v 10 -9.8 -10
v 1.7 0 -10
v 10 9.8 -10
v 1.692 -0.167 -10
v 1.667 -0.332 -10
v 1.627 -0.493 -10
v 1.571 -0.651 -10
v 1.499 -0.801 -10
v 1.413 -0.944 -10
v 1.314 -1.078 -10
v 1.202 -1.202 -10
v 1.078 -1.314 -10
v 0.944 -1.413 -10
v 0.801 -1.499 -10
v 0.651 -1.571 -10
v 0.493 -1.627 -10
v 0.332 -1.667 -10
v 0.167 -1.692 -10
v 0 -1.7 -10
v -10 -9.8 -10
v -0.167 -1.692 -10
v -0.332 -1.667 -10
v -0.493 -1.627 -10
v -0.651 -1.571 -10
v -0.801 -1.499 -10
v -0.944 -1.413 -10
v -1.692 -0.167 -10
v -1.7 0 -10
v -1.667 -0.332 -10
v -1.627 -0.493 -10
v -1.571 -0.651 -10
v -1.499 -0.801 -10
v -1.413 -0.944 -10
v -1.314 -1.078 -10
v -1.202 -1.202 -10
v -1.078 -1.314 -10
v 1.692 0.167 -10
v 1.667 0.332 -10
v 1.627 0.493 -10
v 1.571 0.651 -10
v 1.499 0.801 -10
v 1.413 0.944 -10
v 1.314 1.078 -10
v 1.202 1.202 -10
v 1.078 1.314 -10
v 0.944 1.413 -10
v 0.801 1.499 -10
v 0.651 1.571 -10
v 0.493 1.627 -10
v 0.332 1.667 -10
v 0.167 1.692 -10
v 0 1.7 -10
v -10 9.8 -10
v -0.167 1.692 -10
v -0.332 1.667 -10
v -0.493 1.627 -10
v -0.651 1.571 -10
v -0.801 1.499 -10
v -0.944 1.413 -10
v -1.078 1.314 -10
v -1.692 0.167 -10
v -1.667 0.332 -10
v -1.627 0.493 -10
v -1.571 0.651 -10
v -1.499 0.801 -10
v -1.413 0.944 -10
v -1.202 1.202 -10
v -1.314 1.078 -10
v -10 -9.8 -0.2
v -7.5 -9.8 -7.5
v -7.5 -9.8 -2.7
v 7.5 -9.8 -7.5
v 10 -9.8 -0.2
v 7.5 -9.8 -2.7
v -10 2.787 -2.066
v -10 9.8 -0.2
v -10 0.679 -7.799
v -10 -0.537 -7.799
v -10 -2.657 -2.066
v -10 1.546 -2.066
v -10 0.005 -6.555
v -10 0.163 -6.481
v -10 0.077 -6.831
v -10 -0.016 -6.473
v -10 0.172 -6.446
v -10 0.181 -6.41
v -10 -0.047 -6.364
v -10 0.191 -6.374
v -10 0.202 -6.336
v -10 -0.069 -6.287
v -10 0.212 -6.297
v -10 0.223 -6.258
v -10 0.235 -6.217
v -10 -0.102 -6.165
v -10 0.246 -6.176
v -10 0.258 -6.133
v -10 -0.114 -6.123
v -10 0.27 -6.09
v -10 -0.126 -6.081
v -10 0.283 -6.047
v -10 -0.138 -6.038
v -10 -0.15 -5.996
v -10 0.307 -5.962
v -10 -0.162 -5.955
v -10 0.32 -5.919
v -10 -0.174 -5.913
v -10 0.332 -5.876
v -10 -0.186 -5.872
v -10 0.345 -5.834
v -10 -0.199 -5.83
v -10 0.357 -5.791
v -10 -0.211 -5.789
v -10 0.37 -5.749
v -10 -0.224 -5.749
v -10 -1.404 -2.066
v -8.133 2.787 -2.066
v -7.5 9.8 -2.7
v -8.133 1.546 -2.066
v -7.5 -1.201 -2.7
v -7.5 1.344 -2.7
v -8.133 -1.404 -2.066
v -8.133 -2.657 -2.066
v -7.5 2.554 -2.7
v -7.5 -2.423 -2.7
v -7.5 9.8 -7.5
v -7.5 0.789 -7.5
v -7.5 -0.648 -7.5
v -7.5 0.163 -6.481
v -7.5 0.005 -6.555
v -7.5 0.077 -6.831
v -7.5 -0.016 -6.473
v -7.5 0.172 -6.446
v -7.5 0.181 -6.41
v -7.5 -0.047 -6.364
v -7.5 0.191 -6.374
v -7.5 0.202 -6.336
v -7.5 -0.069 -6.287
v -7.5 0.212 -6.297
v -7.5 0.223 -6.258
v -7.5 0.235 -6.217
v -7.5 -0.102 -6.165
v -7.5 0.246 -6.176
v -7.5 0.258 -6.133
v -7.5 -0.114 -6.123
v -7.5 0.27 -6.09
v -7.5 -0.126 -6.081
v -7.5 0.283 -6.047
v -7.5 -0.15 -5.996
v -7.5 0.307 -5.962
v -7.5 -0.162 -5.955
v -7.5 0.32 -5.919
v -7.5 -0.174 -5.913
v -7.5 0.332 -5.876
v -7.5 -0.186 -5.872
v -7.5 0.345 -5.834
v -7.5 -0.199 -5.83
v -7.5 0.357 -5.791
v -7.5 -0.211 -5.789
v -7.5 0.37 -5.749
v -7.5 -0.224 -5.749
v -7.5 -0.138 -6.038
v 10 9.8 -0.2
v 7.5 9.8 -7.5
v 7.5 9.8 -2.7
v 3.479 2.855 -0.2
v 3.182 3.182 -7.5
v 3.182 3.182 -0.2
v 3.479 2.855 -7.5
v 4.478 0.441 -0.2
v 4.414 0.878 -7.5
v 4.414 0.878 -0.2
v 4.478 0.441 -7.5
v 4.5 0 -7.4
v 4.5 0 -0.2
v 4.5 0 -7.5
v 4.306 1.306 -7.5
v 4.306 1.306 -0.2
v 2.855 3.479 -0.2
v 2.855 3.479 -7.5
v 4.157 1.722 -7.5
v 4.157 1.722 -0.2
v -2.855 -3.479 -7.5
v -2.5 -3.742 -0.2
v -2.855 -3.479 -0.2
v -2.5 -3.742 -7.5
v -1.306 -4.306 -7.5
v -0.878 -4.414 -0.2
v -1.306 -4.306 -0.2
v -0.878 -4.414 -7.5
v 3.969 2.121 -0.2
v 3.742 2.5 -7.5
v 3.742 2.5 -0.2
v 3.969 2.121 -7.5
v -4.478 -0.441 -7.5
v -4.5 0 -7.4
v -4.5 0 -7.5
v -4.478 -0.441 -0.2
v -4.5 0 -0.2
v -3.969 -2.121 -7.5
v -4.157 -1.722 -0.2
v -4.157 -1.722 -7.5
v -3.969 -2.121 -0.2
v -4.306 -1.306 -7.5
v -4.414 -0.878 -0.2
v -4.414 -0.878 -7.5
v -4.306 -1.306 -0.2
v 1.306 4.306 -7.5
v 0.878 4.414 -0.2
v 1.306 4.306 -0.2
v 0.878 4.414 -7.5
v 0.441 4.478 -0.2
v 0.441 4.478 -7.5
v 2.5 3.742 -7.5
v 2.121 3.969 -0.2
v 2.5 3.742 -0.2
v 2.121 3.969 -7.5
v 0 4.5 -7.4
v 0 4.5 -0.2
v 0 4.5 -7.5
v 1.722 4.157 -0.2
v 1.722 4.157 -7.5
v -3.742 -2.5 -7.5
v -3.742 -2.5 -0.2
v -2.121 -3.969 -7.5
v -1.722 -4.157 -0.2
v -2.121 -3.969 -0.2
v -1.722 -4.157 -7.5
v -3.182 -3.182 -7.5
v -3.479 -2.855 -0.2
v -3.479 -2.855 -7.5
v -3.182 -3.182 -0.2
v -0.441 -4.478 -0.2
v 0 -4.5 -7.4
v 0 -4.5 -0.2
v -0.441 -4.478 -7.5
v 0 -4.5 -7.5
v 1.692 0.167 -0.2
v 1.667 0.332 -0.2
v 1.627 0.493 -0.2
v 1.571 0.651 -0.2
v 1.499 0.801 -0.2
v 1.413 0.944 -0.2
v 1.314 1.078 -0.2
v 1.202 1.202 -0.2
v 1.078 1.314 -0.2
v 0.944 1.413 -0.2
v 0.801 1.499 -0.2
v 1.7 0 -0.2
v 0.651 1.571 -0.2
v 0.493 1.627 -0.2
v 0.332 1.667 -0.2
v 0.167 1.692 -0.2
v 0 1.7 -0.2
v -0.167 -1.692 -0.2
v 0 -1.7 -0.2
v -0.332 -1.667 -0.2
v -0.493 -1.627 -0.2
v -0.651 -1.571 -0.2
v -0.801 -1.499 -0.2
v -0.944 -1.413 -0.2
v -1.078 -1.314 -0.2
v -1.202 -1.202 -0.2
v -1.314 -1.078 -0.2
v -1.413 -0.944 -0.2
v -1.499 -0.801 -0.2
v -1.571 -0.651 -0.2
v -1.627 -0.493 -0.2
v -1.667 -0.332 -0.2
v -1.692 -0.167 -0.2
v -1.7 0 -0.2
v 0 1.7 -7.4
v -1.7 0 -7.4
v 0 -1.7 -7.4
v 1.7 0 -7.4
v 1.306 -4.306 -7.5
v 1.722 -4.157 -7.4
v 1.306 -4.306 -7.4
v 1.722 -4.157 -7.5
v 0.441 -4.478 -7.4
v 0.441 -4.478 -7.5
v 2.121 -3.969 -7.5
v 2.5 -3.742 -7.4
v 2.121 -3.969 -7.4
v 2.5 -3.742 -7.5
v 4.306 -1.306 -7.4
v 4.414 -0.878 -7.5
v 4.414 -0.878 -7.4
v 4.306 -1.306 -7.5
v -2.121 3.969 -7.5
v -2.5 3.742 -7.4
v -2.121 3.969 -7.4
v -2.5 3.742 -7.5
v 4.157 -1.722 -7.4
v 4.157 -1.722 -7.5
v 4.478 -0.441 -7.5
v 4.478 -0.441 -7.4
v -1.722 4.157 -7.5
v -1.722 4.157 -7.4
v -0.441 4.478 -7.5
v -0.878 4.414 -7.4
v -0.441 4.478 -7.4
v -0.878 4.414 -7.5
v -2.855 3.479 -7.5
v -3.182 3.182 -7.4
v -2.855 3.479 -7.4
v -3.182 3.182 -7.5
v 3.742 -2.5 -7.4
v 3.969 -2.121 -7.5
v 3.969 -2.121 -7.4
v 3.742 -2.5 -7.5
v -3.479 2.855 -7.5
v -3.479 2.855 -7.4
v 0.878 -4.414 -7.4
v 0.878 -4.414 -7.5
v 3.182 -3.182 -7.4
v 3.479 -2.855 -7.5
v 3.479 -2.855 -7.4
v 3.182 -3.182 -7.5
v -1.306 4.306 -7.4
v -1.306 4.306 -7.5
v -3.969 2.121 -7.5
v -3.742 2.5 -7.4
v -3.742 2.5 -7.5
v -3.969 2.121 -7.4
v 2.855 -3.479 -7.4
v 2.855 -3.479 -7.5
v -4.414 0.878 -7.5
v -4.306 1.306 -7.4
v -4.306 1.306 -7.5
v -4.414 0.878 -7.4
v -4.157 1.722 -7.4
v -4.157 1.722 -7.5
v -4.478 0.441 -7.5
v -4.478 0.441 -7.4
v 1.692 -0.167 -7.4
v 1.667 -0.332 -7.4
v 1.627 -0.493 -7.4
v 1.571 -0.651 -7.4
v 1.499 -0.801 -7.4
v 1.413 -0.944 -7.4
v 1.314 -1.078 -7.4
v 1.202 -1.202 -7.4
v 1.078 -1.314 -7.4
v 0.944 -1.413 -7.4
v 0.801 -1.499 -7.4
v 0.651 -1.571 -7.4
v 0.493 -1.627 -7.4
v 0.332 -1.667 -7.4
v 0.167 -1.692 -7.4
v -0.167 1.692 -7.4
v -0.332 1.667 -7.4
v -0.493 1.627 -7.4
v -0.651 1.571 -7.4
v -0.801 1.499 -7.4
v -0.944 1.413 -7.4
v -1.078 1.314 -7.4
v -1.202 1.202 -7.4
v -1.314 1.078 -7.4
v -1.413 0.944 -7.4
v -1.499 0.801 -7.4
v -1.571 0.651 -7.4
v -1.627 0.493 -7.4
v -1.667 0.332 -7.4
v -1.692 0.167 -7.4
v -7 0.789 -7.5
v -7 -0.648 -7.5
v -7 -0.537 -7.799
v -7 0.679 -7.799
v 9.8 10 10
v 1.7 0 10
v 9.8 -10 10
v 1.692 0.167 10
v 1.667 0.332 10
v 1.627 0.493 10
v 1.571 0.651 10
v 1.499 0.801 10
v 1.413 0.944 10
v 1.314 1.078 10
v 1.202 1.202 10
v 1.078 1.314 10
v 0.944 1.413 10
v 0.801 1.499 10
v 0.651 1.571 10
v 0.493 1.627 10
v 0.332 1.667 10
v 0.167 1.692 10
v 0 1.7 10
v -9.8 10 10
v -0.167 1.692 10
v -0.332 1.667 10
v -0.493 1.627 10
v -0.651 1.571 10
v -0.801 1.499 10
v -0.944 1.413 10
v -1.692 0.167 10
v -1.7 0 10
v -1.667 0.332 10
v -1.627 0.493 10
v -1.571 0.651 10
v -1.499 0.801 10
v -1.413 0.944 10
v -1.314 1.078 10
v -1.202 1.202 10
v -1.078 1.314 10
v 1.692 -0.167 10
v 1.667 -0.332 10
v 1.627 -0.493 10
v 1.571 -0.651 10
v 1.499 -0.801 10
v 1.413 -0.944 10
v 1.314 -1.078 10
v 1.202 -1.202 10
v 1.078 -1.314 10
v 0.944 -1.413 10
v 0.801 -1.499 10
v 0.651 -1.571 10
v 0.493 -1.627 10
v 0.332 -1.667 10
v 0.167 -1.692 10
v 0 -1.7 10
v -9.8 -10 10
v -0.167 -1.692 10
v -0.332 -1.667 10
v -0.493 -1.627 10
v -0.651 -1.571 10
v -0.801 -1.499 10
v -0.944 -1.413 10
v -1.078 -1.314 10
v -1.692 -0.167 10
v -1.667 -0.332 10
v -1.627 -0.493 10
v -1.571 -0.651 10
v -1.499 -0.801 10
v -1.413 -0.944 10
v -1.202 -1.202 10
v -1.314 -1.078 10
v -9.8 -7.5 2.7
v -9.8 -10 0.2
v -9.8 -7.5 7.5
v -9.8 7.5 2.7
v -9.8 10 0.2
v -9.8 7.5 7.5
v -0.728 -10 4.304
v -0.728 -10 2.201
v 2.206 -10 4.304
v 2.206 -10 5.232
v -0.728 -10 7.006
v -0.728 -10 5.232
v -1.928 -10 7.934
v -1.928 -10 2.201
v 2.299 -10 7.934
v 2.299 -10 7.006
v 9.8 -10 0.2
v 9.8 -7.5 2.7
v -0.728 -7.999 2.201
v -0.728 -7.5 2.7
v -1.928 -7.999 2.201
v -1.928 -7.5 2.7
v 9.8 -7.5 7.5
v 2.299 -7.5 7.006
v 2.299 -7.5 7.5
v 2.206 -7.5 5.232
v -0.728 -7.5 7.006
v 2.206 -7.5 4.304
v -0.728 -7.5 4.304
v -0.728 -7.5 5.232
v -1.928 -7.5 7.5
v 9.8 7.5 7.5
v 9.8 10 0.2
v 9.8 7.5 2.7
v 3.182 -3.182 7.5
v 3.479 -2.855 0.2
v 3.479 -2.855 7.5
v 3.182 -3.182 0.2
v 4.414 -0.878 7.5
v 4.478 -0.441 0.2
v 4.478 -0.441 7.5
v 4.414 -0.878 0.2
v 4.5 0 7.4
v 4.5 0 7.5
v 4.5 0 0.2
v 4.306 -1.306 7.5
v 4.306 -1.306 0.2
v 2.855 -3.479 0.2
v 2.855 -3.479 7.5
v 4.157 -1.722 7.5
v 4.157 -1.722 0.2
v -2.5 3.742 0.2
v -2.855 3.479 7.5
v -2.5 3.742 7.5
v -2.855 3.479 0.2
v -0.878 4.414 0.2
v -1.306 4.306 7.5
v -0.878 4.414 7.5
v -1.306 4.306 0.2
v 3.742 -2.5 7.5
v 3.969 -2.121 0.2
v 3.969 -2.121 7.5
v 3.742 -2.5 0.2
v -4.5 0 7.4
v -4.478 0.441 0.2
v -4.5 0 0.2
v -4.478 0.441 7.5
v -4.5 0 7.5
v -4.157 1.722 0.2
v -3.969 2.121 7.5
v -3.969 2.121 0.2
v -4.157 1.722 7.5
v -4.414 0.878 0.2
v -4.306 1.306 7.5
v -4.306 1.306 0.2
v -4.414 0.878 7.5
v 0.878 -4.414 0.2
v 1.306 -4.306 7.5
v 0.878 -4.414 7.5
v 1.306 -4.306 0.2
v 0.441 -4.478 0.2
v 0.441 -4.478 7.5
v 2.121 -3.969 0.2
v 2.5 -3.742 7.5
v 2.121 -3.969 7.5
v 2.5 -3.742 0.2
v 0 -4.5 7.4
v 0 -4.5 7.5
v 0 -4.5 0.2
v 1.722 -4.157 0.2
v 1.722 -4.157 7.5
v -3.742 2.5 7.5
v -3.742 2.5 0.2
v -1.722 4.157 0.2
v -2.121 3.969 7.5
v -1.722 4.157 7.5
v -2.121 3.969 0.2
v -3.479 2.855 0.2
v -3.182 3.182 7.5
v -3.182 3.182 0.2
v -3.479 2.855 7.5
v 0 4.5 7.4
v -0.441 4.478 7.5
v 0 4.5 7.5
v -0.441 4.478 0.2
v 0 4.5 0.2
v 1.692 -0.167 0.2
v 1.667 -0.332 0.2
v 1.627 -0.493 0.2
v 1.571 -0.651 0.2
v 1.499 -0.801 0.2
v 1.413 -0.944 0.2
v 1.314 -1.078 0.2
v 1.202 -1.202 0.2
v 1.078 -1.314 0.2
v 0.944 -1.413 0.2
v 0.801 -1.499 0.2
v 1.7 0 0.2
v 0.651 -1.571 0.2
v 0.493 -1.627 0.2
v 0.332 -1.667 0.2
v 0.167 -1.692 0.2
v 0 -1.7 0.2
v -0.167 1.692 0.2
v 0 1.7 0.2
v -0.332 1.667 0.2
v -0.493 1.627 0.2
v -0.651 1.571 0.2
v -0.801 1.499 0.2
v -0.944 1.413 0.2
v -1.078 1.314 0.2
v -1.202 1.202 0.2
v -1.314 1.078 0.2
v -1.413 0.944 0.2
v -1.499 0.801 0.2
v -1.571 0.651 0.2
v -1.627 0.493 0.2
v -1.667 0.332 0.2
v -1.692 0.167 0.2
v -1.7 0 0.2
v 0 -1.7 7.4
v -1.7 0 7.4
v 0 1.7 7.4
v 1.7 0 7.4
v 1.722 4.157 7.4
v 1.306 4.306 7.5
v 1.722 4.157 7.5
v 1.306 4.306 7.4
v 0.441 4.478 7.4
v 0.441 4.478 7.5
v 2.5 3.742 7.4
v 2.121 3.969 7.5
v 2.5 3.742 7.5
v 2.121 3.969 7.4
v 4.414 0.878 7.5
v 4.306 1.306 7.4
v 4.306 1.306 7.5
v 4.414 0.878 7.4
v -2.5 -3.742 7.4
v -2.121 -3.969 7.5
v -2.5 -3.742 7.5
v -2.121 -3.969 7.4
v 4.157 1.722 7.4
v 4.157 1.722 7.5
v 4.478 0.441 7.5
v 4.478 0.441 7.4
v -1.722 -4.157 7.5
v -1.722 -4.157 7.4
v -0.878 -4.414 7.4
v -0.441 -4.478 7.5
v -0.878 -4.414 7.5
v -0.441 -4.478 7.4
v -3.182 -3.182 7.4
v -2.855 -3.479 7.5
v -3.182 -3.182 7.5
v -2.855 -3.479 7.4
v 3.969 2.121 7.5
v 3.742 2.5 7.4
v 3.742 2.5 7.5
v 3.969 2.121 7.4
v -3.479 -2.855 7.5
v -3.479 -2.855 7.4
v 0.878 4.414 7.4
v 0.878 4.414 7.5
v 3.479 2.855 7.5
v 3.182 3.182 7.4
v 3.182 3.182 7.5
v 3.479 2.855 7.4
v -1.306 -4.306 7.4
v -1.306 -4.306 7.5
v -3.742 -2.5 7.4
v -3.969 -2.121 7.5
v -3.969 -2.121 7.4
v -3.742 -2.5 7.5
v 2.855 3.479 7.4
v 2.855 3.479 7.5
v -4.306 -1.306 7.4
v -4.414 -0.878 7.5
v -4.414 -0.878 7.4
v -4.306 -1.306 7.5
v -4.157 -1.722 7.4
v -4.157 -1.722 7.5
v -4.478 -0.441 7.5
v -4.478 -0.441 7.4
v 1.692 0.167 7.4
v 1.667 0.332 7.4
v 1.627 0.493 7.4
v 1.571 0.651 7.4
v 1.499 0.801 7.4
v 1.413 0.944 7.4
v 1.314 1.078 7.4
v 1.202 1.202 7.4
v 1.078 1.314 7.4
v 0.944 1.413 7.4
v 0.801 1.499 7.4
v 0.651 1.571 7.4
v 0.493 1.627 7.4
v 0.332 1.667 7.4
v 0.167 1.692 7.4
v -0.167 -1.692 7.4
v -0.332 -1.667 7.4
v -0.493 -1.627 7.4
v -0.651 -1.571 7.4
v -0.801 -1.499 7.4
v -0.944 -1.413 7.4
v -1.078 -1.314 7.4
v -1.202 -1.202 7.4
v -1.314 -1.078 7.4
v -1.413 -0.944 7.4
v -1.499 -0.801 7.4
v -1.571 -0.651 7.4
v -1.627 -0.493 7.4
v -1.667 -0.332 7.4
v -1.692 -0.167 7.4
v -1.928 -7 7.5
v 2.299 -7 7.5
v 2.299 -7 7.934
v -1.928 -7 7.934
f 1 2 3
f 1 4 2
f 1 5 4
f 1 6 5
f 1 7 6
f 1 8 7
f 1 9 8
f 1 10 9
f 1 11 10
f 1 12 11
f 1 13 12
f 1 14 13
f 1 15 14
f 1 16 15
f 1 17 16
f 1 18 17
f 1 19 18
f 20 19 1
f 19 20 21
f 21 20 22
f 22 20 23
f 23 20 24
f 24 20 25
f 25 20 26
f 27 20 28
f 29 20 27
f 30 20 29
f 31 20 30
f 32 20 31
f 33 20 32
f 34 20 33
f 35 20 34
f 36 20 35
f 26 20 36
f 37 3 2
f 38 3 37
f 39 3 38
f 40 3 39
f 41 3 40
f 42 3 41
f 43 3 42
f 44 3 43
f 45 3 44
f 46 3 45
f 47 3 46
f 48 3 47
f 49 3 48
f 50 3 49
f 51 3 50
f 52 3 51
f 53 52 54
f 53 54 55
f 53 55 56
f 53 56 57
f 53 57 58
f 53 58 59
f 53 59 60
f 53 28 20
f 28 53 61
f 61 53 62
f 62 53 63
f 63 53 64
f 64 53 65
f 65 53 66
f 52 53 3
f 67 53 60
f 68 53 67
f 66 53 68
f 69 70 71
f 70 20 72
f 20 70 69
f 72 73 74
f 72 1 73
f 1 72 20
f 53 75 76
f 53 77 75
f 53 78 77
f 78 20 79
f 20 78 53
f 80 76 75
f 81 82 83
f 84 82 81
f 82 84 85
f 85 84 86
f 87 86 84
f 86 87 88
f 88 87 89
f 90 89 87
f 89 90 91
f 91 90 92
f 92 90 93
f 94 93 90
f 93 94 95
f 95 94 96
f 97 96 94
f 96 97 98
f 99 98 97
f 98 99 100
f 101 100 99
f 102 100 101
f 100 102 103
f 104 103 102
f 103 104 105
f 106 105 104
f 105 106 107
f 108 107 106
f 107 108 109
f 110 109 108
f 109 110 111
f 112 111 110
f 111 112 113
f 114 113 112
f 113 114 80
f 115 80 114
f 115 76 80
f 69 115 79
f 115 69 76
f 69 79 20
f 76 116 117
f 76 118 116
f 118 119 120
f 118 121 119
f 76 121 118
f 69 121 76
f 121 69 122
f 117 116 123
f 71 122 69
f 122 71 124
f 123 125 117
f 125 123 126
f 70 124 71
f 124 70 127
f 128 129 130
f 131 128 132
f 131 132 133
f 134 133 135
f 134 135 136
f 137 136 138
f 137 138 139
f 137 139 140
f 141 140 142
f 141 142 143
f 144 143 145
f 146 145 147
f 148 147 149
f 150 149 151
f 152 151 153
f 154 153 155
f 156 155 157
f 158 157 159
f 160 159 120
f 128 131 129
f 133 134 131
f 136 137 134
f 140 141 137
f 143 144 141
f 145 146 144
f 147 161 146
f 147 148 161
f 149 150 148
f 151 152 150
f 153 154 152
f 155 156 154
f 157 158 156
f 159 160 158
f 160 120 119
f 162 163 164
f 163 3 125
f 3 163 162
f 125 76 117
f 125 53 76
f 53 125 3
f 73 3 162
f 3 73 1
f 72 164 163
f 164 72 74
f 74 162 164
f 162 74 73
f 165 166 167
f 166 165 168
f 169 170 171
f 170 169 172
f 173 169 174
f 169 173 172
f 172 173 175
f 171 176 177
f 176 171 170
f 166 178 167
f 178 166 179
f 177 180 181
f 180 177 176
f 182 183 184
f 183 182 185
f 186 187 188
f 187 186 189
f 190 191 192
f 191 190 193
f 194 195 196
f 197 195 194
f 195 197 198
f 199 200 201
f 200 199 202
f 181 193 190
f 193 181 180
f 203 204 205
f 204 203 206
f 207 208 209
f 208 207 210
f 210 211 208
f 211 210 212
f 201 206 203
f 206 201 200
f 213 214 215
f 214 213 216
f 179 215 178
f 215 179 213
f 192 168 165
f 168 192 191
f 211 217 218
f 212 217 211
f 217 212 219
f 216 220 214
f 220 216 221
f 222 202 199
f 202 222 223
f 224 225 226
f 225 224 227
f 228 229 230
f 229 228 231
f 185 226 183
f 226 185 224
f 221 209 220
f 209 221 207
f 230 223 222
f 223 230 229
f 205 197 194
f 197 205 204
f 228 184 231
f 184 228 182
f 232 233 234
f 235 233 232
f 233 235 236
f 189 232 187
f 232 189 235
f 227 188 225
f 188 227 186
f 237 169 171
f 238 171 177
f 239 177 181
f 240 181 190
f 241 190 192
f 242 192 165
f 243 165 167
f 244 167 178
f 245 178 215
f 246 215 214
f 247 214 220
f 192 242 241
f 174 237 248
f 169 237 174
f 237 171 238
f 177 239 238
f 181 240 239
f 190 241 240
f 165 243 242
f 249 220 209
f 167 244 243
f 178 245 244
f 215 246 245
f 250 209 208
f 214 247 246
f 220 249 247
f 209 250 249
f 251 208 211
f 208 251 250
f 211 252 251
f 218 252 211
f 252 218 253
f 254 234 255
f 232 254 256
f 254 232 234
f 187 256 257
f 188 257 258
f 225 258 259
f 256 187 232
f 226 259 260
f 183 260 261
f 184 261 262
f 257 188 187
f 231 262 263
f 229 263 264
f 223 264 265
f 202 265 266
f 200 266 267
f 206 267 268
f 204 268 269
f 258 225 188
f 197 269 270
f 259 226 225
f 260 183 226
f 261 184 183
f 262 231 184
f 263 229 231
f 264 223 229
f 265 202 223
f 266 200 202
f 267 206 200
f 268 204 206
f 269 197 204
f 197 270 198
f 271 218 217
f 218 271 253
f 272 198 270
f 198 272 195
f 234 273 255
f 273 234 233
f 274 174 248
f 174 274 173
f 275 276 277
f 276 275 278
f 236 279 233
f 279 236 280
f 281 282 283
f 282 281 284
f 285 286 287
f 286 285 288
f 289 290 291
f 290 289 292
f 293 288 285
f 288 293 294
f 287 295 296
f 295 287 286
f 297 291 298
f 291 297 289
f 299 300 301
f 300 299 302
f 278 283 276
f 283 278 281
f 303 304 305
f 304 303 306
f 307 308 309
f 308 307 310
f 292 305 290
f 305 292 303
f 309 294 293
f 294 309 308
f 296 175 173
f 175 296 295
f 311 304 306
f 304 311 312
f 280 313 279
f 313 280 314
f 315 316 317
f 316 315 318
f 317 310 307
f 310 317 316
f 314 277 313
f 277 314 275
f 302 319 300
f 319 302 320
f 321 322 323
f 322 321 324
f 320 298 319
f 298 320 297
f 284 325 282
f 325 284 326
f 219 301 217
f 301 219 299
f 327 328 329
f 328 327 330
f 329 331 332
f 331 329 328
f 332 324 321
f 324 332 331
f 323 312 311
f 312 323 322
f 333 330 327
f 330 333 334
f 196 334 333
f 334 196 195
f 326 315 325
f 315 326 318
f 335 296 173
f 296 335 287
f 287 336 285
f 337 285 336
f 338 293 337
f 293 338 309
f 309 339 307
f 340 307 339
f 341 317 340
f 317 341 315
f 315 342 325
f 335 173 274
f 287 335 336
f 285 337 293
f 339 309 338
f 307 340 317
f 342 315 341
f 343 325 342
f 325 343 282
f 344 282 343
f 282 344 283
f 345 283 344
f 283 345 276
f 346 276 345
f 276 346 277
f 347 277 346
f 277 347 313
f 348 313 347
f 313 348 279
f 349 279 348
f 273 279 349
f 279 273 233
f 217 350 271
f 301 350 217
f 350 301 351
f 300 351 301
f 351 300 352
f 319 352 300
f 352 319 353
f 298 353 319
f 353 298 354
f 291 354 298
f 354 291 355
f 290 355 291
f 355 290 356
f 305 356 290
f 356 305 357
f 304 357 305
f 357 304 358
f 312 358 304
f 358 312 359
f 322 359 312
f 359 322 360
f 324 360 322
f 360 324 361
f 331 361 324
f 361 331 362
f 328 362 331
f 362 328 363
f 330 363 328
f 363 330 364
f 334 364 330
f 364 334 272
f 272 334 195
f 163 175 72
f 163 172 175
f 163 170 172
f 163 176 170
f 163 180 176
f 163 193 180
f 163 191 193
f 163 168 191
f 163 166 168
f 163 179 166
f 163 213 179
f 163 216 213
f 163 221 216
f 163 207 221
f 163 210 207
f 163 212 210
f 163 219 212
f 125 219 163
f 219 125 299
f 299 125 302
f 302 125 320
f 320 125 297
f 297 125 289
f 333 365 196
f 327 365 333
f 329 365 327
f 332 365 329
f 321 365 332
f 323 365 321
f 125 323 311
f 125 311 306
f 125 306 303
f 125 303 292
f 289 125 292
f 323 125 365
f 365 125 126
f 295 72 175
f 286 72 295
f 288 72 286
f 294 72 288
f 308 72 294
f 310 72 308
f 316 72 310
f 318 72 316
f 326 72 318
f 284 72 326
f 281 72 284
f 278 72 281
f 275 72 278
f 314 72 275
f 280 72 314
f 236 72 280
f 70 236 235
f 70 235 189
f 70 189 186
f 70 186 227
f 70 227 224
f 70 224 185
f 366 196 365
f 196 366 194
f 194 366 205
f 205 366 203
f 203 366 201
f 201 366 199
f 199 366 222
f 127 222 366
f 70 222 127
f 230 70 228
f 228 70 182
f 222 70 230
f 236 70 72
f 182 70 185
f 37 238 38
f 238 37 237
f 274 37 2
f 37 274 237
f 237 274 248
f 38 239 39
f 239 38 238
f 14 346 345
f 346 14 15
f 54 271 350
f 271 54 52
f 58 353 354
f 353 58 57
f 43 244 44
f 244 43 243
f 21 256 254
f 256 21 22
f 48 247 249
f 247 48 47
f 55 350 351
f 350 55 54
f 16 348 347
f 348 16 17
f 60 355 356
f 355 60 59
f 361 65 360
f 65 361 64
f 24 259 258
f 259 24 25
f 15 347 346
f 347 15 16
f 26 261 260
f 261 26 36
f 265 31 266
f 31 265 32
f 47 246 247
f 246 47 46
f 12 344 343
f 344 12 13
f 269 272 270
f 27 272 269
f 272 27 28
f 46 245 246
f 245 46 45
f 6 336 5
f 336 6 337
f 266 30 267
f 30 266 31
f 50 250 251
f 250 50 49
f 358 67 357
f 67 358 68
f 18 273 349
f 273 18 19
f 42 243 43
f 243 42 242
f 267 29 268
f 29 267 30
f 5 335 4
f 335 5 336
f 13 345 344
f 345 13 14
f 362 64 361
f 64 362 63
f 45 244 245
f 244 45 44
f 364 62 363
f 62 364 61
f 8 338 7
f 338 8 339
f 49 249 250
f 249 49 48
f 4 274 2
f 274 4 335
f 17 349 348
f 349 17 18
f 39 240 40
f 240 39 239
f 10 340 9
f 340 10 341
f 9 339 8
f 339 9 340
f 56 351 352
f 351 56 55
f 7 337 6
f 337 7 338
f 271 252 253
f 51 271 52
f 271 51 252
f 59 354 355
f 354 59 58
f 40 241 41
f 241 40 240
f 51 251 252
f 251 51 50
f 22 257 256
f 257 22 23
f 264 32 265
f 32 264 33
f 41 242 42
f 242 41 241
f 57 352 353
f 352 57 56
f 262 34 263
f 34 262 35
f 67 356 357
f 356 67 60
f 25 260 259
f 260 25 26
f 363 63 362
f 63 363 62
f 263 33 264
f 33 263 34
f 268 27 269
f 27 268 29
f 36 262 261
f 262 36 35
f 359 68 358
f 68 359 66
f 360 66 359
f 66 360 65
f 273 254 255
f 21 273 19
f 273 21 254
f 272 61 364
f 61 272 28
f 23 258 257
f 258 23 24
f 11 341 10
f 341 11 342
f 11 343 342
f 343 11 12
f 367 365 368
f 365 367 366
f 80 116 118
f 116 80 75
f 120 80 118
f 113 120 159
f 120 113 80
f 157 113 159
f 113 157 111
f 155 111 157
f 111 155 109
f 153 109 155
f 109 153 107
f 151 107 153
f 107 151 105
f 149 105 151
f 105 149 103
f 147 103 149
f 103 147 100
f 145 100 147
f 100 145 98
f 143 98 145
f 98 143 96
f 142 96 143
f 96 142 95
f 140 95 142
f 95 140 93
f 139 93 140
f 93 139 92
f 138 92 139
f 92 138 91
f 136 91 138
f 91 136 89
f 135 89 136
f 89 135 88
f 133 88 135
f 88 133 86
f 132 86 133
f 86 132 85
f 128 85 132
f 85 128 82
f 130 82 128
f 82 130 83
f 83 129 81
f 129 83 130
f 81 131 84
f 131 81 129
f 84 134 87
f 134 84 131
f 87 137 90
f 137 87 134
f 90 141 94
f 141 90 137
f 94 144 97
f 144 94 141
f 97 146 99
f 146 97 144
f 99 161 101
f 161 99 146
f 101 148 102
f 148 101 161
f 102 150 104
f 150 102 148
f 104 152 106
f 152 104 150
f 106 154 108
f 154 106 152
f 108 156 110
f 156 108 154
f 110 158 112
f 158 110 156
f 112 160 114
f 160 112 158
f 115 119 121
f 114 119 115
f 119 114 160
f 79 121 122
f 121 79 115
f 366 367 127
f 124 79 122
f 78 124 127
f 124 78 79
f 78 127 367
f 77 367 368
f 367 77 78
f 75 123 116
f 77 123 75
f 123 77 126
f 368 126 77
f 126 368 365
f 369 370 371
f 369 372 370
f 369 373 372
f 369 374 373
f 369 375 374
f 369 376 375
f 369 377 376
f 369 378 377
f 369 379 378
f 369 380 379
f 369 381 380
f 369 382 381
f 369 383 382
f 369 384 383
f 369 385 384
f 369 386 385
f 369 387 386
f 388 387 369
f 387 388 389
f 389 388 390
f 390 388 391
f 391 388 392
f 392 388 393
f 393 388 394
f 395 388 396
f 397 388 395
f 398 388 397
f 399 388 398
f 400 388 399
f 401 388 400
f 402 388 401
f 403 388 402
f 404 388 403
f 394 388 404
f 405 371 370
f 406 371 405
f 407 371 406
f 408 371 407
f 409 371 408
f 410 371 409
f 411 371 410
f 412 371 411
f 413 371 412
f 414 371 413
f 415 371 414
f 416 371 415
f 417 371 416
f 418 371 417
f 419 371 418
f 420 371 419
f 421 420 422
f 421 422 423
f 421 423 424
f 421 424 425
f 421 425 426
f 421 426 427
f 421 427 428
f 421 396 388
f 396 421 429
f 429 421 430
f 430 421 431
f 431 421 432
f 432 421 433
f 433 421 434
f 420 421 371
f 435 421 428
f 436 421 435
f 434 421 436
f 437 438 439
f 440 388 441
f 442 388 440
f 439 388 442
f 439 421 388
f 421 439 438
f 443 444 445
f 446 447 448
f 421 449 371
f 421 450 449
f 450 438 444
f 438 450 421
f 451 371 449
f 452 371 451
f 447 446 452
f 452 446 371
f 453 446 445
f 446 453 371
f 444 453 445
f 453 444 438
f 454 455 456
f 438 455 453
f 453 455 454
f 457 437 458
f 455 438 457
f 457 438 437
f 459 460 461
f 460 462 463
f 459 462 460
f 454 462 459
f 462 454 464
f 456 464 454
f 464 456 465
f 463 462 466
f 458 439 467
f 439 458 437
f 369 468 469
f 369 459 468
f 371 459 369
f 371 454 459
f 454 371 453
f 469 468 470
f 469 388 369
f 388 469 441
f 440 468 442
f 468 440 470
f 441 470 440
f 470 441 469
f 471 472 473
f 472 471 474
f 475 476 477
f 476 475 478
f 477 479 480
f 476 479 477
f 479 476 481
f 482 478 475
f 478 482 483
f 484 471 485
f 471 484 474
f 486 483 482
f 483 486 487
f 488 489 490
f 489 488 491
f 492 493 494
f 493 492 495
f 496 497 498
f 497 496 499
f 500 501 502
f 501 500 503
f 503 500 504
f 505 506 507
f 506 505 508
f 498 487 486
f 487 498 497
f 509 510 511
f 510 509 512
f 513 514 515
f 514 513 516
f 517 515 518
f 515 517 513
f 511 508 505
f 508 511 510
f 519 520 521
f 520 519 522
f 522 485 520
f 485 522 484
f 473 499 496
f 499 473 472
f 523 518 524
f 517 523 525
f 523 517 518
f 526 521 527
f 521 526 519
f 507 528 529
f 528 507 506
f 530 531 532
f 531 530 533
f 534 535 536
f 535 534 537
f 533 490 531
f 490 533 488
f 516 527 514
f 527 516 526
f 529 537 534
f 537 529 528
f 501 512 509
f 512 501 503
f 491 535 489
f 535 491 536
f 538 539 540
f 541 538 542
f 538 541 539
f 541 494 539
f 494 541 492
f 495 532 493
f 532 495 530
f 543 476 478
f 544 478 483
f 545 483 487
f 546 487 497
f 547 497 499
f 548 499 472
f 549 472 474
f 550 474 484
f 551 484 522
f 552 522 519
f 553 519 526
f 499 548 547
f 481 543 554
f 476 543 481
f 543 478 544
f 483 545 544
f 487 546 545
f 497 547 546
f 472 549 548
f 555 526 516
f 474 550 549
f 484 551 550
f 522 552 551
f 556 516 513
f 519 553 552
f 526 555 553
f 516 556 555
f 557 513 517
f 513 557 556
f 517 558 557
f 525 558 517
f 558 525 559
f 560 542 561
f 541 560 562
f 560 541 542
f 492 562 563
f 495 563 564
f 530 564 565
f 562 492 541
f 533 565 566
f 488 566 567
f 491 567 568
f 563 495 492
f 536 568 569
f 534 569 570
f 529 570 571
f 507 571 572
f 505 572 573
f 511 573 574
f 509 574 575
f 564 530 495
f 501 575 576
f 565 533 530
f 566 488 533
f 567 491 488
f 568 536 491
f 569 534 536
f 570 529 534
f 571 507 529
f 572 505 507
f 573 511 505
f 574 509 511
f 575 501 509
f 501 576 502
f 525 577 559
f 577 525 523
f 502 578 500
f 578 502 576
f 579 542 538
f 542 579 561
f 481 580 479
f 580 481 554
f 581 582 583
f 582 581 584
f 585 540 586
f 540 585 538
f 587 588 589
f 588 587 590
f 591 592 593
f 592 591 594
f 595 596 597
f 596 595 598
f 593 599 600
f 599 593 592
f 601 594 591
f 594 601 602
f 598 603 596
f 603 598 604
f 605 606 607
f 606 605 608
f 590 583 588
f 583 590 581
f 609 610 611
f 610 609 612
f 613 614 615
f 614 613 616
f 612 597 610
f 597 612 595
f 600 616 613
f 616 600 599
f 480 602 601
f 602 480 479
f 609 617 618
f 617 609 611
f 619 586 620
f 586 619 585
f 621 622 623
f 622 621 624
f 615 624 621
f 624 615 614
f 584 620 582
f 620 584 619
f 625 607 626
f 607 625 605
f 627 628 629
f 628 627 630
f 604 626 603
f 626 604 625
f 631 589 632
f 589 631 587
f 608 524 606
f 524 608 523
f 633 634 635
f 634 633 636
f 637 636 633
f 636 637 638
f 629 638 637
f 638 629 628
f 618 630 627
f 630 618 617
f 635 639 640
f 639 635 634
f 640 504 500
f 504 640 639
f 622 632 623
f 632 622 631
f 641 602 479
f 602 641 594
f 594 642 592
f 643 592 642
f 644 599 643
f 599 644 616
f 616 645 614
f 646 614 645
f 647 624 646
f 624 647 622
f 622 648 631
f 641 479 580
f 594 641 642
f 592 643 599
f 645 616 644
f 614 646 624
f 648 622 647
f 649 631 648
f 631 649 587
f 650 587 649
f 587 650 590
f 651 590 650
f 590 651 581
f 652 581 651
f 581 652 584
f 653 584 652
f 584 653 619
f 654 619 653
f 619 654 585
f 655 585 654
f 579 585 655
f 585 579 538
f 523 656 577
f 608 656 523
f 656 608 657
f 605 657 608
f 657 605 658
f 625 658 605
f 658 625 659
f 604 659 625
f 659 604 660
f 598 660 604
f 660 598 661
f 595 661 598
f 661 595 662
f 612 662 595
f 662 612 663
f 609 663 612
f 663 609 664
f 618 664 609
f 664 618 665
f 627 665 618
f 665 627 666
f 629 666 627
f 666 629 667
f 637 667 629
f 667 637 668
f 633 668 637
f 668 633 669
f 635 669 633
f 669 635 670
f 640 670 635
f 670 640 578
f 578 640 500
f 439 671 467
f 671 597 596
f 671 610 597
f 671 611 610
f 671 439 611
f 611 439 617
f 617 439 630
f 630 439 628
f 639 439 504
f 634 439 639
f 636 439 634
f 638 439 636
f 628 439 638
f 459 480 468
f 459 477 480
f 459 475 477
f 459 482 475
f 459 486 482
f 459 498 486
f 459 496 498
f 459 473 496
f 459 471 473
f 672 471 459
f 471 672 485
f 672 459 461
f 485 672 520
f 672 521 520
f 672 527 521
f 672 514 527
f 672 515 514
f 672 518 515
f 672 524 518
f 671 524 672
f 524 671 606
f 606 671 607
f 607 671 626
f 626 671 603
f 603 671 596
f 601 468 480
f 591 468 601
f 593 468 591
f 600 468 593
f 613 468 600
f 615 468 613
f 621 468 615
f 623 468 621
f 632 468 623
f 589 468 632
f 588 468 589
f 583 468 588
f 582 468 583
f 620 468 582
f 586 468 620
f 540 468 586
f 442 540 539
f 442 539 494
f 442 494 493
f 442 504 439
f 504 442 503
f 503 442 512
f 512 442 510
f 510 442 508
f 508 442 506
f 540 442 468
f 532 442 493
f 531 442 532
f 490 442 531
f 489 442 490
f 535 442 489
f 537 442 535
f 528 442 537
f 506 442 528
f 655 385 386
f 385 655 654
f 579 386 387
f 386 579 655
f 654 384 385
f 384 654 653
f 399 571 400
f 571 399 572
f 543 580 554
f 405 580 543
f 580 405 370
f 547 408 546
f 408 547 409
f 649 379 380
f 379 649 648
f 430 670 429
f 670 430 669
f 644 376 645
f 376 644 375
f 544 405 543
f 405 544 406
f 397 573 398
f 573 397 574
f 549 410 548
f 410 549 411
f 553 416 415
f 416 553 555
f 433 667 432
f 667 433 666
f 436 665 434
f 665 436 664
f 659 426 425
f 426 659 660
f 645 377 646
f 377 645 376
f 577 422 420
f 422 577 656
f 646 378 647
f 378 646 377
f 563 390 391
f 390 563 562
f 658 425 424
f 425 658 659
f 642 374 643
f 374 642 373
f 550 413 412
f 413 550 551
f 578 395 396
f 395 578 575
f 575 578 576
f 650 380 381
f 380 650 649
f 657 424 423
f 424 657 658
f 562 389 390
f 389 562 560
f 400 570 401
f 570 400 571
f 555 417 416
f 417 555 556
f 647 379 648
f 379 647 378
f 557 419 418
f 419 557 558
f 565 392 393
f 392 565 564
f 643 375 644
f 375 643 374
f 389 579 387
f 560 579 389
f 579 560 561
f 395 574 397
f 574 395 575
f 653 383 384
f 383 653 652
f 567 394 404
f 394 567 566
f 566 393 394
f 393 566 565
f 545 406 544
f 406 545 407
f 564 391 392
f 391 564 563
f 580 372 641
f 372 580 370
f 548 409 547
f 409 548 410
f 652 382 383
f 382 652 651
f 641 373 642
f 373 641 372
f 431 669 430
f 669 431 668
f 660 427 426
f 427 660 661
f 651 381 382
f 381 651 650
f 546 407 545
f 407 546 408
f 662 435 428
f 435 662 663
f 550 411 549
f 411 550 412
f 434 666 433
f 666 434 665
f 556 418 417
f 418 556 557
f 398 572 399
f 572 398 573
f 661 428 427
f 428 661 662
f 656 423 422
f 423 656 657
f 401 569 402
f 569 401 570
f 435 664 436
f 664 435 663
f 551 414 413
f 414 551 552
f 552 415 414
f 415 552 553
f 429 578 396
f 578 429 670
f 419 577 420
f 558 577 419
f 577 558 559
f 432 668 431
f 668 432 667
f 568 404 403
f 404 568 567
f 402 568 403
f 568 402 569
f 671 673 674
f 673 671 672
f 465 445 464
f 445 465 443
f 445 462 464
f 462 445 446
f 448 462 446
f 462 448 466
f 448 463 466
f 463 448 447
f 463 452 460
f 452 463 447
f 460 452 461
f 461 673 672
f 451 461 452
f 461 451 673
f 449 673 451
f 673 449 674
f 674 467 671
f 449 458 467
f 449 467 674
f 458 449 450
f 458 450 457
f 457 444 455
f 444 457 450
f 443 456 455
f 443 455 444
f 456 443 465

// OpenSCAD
// file: half_cube.scad
// half_cube.scad - Simplified Parametric Half-Cube
// Designed for verification: single volume, watertight, no collision
// Units: mm

$fn = 64;

// --- Parameters ---
size = 20.0;          // Outer cube dimension
thick = 2.5;          // Wall thickness
rod_D = 3.0;          // Rod diameter
clearance = 0.2;      // Clearance for rod bore
fit_clear = 0.2;      // Miter face clearance (increased per research)

// --- Visibility Toggles ---
show_base = true;
show_walls = true;
show_mech = true;
show_letter = true;

// --- Flip Mode (for top unit) ---
is_flipped = false;        // true = top unit (rotated mechanism, inverted letter)

// --- Letter Parameters ---
letter = is_flipped ? "F" : "V";  // Default: V for bottom, F for top
letter_emboss = false;     // true = raised, false = carved
letter_depth = 0.5;        // Depth/height of letter (mm)
letter_size = 6;           // Font size (mm)

// Derived
cyl_R = 4.5;          // Mechanism cylinder radius
cyl_H = size/2 - thick - fit_clear; // Height from base top to part top

// --- Main Assembly ---
module assembly(flipped=is_flipped) {
    difference() {
        union() {
            // 1. Base Plate (bottom of U-channel)
            if (show_base)
                translate([0, 0, -size/2 + thick/2])
                    base_plate();
            
            // 2. Side Walls with mitered edges
            if (show_walls) {
                translate([-size/2 + thick/2, 0, 0])
                    mitered_wall();
                translate([size/2 - thick/2, 0, 0])
                    mirror([1,0,0]) mitered_wall();
            }
            
            // 3. Central mechanism pillars
            // Position at base plate bottom (z=-10) so base_ring spans through base
            if (show_mech)
                translate([0, 0, -size/2])  // Start at very bottom of part
                    mechanism_pillars(flipped=flipped);
            
            // 4. Letter (embossed mode - raised)
            if (show_letter && letter_emboss)
                letter_geometry(flipped=flipped);
        }
        
        // Global subtractions
        // Rod bore through center
        cylinder(r=rod_D/2 + clearance, h=size*2, center=true);
        
        // Letter (carved mode - recessed)
        if (show_letter && !letter_emboss)
            letter_geometry(flipped=flipped);
    }
}

// --- Base Plate ---
// Full width in X and Y, with trapezoid profile in Y-Z
module base_plate() {
    // Simple rectangular base that spans full width
    // The Y dimension must go edge to edge (minus clearance)
    cube([size - 2*fit_clear, size - 2*fit_clear, thick], center=true);
}

// --- Mitered Wall ---
// Wall with 45° chamfer only on top for mating interface
// Wall only spans HALF the cube (from base to midpoint)
module mitered_wall() {
    // The wall needs to span: 
    //   X = thick (wall thickness)
    //   Y = size (full cube width, minus clearance)
    //   Z = half cube height (from -size/2 to -fit_clear)
    
    wall_length = size - 2*fit_clear;  // Y dimension
    
    // Rotate the extrusion so it extends along Y instead of Z
    rotate([90, 0, 0])  // Rotate -90° around X to point extrusion in -Y (then center=true makes it +/-Y)
    linear_extrude(wall_length, center=true)  // This now extrudes along Y
        // Polygon in XZ plane (after rotation, this becomes the actual XZ plane of the wall)
        polygon([
            [-thick/2, -size/2],             // Bottom-outer (z=-10)
            [-thick/2, -fit_clear],          // Top-outer (z=-0.2)
            [thick/2, -thick - fit_clear],   // Top-inner (z=-2.7, chamfered)
            [thick/2, -size/2]               // Bottom-inner (z=-10)
        ]);
}

// --- Letter Geometry ---
// Places letter on left wall exterior
// Flipped 180° for top unit so it reads correctly after assembly
module letter_geometry(flipped=is_flipped) {
    // Position on left wall exterior face
    wall_x = -size/2;  // Left wall position
    letter_z = -size/4;  // Center of wall height
    
    // Determine letter and rotation based on local flipped state
    local_letter = flipped ? "F" : "V";
    
    // Rotation: 90° to face outward from wall
    // When flipped: add 180° so letter reads correctly after assembly flip
    flip_angle = flipped ? 180 : 0;
    
    translate([wall_x, 0, letter_z])
        rotate([90, flip_angle, 90]) { // Face outward (-X direction)
            // Counter-mirror for flipped unit to ensure text reads Left-to-Right
            scale([flipped ? -1 : 1, 1, 1])
            
            linear_extrude(letter_depth + (letter_emboss ? 0 : thick))
                text(local_letter, size=letter_size, halign="center", valign="center", 
                     font="Liberation Sans:style=Bold");
}
}

// --- Mechanism Pillars ---
// Two opposing quadrant pillars with a solid base ring
// Bottom unit: pillars at 0°/180°, cuts at 90°/270°
// Flipped unit: pillars at 90°/270°, cuts at 0°/180° (rotated 90°)
module mechanism_pillars(flipped=is_flipped) {
    base_ring_h = thick + 0.1;  // Height of solid ring = base plate thickness + overlap
    pillar_height = cyl_H;
    
    // Rotate entire mechanism 90° for flipped (top) unit
    mech_rotation = flipped ? 90 : 0;
    
    rotate([0, 0, mech_rotation])
    union() {
        // 1. Solid base ring (no wedge cuts) - this connects to base plate
        cylinder(r=cyl_R, h=base_ring_h);
        
        // 2. Pillars above the base ring (with wedge cuts)
        translate([0, 0, base_ring_h - 0.1])  // Small overlap for solid union
            difference() {
                cylinder(r=cyl_R, h=pillar_height);
                
                // Cut away two opposing quadrants (90° and 270°)
                rotate([0, 0, 90])
                    wedge_cutter(pillar_height + 1);
                rotate([0, 0, 270])
                    wedge_cutter(pillar_height + 1);
            }
    }
}

// Wedge cutter for 90° sector
module wedge_cutter(h=size) {
    linear_extrude(h)
        polygon([[0, 0], [size, 0], [0, size]]);
}

// --- Render ---
// Only render if not included as library
if (is_undef(is_library)) {
    assembly();
}
// main file
// Suppress default render in half_cube
is_library = 1;
include <half_cube.scad>

// --- Parameters ---
// Inherits size, thick, rod_D from half_cube via command line

render_mode = 0; // Part selector (see project.json manifest): 0=all, 1=bottom, 2=top

// --- Main Assembly ---
// A single interlocking cube (two half-cubes)

// Part A: Right-side up (Bottom Unit)
if (render_mode == 0 || render_mode == 1)
    assembly();

// Part B: Upside down and Rotated 90 (Top Unit)
if (render_mode == 0 || render_mode == 2)
    rotate([180, 0, 90]) assembly(flipped=true);
